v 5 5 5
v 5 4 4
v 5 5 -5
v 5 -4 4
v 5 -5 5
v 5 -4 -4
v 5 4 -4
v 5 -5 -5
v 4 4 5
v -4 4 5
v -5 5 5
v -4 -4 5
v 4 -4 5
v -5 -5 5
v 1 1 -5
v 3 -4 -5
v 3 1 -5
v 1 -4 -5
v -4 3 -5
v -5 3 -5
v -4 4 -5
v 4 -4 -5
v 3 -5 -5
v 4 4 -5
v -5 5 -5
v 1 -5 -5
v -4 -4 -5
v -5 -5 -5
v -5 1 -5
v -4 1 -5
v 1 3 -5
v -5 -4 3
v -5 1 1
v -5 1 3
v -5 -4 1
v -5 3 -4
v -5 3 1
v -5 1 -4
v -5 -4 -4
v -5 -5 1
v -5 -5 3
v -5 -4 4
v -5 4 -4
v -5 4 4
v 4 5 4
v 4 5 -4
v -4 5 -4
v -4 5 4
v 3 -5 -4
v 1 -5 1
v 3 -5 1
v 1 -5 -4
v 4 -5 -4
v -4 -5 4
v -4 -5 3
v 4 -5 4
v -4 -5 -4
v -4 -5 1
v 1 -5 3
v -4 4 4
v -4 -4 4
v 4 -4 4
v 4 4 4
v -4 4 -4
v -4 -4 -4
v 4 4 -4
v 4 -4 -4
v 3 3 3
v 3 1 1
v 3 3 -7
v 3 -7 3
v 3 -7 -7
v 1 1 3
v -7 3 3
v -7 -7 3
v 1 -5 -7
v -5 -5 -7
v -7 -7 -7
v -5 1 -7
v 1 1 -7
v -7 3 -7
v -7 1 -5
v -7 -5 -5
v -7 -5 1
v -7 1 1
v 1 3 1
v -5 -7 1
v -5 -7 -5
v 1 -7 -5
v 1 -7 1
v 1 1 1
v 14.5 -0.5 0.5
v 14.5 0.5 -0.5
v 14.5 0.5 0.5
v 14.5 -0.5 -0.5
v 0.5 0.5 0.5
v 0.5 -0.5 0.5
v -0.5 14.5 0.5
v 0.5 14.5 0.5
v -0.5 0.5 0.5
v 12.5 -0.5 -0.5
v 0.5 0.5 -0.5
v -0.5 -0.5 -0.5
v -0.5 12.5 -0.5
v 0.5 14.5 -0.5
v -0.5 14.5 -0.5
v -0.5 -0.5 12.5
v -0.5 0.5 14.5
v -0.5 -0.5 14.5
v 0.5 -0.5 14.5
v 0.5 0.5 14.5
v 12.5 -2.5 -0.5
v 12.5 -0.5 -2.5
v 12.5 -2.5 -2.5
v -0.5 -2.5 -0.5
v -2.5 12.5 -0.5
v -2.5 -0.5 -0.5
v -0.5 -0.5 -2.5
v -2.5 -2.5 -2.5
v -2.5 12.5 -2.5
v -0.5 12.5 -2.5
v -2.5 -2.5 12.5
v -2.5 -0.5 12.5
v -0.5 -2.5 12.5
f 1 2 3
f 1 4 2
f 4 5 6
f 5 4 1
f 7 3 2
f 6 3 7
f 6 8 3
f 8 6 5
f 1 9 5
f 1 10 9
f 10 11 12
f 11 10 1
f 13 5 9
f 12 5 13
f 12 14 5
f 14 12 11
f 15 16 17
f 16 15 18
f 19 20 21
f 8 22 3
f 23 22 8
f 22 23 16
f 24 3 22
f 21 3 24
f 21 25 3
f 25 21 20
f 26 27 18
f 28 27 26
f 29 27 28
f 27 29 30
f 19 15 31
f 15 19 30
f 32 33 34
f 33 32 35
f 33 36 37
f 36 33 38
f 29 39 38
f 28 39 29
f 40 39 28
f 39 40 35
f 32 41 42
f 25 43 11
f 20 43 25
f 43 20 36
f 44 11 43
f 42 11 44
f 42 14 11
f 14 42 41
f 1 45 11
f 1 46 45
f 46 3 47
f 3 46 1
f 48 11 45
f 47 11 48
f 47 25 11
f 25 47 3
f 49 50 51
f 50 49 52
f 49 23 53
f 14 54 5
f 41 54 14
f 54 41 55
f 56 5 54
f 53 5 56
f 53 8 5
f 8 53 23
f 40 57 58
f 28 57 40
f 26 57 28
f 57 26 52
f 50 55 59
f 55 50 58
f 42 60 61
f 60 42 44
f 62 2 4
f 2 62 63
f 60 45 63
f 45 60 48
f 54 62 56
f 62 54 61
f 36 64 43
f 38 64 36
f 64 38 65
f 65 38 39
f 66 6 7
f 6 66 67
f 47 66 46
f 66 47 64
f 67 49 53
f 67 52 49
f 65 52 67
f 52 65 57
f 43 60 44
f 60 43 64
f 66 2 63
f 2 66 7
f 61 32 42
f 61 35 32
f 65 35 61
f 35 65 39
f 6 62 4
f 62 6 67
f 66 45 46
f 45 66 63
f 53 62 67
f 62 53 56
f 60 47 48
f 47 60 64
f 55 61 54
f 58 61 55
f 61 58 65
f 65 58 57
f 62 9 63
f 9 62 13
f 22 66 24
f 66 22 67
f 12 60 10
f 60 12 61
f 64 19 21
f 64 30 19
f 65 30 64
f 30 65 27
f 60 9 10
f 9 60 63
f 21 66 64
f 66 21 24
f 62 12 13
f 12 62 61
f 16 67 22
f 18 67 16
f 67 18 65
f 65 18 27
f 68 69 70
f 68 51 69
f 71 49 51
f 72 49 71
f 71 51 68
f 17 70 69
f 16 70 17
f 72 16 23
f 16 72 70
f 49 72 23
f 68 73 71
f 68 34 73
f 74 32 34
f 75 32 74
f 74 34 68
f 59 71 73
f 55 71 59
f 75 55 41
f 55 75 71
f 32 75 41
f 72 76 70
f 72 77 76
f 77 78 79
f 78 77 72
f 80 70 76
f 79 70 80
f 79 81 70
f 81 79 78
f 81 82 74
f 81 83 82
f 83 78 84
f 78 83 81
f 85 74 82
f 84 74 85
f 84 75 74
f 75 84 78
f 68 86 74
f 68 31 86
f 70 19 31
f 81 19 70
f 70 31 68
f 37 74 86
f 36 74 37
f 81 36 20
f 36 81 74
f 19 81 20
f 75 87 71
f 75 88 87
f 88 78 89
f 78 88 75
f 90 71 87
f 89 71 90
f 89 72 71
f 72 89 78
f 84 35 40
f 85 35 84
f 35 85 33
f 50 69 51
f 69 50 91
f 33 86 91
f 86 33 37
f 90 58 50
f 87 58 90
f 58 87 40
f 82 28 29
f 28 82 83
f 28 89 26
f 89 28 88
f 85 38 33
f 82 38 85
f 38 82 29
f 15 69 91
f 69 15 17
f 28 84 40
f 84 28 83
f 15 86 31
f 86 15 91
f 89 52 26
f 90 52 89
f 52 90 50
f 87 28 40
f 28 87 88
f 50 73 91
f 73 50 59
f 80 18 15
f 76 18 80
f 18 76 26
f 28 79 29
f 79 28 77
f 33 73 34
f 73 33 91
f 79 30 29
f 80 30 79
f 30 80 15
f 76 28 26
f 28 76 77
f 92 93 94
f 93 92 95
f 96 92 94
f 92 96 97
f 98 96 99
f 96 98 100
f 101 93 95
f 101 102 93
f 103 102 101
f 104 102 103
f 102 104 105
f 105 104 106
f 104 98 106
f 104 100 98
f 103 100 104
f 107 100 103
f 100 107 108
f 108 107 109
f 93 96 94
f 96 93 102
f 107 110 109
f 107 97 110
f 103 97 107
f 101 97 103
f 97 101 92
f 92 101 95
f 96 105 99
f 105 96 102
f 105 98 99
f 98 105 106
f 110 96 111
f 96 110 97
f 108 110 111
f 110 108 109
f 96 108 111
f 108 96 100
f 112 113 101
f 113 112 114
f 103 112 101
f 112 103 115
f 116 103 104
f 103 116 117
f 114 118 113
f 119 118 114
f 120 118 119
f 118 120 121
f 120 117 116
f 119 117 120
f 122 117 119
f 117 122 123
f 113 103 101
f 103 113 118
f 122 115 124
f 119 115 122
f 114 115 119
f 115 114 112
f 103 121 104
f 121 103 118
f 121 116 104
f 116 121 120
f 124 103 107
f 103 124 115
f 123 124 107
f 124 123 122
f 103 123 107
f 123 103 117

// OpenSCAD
b=2;//border thickness

color("white"){
difference(){
cube(10,true);
cube([12,8,8],true);
cube([8,12,8],true);
cube([8,8,12],true);
}
}
color("black"){
translate([-b,-b,-b]){
difference(){
cube(10,true);
cube([12,8-b,8-b],true);
cube([8-b,12,8-b],true);
cube([8-b,8-b,12],true);
}
}
}

color("white"){
translate([-0.5,-0.5,-0.5]){
    cube([15,1,1]);
    cube([1,15,1]);
    cube([1,1,15]);
}
}

color("black"){
translate([-0.5-b,-0.5-b,-0.5-b]){
    cube([15,1+b/2,1+b/2]);
    cube([1+b/2,15,1+b/2]);
    cube([1+b/2,1+b/2,15]);
}
}

$vpr=[55,0,135];
$vpt=[0,0,2.5];
$vpd=60;

//openscad ticanode_logo.scad -o ticanode_logo.png --colorscheme=Starnight --imgsize=1000,1000 --projection=ortho
